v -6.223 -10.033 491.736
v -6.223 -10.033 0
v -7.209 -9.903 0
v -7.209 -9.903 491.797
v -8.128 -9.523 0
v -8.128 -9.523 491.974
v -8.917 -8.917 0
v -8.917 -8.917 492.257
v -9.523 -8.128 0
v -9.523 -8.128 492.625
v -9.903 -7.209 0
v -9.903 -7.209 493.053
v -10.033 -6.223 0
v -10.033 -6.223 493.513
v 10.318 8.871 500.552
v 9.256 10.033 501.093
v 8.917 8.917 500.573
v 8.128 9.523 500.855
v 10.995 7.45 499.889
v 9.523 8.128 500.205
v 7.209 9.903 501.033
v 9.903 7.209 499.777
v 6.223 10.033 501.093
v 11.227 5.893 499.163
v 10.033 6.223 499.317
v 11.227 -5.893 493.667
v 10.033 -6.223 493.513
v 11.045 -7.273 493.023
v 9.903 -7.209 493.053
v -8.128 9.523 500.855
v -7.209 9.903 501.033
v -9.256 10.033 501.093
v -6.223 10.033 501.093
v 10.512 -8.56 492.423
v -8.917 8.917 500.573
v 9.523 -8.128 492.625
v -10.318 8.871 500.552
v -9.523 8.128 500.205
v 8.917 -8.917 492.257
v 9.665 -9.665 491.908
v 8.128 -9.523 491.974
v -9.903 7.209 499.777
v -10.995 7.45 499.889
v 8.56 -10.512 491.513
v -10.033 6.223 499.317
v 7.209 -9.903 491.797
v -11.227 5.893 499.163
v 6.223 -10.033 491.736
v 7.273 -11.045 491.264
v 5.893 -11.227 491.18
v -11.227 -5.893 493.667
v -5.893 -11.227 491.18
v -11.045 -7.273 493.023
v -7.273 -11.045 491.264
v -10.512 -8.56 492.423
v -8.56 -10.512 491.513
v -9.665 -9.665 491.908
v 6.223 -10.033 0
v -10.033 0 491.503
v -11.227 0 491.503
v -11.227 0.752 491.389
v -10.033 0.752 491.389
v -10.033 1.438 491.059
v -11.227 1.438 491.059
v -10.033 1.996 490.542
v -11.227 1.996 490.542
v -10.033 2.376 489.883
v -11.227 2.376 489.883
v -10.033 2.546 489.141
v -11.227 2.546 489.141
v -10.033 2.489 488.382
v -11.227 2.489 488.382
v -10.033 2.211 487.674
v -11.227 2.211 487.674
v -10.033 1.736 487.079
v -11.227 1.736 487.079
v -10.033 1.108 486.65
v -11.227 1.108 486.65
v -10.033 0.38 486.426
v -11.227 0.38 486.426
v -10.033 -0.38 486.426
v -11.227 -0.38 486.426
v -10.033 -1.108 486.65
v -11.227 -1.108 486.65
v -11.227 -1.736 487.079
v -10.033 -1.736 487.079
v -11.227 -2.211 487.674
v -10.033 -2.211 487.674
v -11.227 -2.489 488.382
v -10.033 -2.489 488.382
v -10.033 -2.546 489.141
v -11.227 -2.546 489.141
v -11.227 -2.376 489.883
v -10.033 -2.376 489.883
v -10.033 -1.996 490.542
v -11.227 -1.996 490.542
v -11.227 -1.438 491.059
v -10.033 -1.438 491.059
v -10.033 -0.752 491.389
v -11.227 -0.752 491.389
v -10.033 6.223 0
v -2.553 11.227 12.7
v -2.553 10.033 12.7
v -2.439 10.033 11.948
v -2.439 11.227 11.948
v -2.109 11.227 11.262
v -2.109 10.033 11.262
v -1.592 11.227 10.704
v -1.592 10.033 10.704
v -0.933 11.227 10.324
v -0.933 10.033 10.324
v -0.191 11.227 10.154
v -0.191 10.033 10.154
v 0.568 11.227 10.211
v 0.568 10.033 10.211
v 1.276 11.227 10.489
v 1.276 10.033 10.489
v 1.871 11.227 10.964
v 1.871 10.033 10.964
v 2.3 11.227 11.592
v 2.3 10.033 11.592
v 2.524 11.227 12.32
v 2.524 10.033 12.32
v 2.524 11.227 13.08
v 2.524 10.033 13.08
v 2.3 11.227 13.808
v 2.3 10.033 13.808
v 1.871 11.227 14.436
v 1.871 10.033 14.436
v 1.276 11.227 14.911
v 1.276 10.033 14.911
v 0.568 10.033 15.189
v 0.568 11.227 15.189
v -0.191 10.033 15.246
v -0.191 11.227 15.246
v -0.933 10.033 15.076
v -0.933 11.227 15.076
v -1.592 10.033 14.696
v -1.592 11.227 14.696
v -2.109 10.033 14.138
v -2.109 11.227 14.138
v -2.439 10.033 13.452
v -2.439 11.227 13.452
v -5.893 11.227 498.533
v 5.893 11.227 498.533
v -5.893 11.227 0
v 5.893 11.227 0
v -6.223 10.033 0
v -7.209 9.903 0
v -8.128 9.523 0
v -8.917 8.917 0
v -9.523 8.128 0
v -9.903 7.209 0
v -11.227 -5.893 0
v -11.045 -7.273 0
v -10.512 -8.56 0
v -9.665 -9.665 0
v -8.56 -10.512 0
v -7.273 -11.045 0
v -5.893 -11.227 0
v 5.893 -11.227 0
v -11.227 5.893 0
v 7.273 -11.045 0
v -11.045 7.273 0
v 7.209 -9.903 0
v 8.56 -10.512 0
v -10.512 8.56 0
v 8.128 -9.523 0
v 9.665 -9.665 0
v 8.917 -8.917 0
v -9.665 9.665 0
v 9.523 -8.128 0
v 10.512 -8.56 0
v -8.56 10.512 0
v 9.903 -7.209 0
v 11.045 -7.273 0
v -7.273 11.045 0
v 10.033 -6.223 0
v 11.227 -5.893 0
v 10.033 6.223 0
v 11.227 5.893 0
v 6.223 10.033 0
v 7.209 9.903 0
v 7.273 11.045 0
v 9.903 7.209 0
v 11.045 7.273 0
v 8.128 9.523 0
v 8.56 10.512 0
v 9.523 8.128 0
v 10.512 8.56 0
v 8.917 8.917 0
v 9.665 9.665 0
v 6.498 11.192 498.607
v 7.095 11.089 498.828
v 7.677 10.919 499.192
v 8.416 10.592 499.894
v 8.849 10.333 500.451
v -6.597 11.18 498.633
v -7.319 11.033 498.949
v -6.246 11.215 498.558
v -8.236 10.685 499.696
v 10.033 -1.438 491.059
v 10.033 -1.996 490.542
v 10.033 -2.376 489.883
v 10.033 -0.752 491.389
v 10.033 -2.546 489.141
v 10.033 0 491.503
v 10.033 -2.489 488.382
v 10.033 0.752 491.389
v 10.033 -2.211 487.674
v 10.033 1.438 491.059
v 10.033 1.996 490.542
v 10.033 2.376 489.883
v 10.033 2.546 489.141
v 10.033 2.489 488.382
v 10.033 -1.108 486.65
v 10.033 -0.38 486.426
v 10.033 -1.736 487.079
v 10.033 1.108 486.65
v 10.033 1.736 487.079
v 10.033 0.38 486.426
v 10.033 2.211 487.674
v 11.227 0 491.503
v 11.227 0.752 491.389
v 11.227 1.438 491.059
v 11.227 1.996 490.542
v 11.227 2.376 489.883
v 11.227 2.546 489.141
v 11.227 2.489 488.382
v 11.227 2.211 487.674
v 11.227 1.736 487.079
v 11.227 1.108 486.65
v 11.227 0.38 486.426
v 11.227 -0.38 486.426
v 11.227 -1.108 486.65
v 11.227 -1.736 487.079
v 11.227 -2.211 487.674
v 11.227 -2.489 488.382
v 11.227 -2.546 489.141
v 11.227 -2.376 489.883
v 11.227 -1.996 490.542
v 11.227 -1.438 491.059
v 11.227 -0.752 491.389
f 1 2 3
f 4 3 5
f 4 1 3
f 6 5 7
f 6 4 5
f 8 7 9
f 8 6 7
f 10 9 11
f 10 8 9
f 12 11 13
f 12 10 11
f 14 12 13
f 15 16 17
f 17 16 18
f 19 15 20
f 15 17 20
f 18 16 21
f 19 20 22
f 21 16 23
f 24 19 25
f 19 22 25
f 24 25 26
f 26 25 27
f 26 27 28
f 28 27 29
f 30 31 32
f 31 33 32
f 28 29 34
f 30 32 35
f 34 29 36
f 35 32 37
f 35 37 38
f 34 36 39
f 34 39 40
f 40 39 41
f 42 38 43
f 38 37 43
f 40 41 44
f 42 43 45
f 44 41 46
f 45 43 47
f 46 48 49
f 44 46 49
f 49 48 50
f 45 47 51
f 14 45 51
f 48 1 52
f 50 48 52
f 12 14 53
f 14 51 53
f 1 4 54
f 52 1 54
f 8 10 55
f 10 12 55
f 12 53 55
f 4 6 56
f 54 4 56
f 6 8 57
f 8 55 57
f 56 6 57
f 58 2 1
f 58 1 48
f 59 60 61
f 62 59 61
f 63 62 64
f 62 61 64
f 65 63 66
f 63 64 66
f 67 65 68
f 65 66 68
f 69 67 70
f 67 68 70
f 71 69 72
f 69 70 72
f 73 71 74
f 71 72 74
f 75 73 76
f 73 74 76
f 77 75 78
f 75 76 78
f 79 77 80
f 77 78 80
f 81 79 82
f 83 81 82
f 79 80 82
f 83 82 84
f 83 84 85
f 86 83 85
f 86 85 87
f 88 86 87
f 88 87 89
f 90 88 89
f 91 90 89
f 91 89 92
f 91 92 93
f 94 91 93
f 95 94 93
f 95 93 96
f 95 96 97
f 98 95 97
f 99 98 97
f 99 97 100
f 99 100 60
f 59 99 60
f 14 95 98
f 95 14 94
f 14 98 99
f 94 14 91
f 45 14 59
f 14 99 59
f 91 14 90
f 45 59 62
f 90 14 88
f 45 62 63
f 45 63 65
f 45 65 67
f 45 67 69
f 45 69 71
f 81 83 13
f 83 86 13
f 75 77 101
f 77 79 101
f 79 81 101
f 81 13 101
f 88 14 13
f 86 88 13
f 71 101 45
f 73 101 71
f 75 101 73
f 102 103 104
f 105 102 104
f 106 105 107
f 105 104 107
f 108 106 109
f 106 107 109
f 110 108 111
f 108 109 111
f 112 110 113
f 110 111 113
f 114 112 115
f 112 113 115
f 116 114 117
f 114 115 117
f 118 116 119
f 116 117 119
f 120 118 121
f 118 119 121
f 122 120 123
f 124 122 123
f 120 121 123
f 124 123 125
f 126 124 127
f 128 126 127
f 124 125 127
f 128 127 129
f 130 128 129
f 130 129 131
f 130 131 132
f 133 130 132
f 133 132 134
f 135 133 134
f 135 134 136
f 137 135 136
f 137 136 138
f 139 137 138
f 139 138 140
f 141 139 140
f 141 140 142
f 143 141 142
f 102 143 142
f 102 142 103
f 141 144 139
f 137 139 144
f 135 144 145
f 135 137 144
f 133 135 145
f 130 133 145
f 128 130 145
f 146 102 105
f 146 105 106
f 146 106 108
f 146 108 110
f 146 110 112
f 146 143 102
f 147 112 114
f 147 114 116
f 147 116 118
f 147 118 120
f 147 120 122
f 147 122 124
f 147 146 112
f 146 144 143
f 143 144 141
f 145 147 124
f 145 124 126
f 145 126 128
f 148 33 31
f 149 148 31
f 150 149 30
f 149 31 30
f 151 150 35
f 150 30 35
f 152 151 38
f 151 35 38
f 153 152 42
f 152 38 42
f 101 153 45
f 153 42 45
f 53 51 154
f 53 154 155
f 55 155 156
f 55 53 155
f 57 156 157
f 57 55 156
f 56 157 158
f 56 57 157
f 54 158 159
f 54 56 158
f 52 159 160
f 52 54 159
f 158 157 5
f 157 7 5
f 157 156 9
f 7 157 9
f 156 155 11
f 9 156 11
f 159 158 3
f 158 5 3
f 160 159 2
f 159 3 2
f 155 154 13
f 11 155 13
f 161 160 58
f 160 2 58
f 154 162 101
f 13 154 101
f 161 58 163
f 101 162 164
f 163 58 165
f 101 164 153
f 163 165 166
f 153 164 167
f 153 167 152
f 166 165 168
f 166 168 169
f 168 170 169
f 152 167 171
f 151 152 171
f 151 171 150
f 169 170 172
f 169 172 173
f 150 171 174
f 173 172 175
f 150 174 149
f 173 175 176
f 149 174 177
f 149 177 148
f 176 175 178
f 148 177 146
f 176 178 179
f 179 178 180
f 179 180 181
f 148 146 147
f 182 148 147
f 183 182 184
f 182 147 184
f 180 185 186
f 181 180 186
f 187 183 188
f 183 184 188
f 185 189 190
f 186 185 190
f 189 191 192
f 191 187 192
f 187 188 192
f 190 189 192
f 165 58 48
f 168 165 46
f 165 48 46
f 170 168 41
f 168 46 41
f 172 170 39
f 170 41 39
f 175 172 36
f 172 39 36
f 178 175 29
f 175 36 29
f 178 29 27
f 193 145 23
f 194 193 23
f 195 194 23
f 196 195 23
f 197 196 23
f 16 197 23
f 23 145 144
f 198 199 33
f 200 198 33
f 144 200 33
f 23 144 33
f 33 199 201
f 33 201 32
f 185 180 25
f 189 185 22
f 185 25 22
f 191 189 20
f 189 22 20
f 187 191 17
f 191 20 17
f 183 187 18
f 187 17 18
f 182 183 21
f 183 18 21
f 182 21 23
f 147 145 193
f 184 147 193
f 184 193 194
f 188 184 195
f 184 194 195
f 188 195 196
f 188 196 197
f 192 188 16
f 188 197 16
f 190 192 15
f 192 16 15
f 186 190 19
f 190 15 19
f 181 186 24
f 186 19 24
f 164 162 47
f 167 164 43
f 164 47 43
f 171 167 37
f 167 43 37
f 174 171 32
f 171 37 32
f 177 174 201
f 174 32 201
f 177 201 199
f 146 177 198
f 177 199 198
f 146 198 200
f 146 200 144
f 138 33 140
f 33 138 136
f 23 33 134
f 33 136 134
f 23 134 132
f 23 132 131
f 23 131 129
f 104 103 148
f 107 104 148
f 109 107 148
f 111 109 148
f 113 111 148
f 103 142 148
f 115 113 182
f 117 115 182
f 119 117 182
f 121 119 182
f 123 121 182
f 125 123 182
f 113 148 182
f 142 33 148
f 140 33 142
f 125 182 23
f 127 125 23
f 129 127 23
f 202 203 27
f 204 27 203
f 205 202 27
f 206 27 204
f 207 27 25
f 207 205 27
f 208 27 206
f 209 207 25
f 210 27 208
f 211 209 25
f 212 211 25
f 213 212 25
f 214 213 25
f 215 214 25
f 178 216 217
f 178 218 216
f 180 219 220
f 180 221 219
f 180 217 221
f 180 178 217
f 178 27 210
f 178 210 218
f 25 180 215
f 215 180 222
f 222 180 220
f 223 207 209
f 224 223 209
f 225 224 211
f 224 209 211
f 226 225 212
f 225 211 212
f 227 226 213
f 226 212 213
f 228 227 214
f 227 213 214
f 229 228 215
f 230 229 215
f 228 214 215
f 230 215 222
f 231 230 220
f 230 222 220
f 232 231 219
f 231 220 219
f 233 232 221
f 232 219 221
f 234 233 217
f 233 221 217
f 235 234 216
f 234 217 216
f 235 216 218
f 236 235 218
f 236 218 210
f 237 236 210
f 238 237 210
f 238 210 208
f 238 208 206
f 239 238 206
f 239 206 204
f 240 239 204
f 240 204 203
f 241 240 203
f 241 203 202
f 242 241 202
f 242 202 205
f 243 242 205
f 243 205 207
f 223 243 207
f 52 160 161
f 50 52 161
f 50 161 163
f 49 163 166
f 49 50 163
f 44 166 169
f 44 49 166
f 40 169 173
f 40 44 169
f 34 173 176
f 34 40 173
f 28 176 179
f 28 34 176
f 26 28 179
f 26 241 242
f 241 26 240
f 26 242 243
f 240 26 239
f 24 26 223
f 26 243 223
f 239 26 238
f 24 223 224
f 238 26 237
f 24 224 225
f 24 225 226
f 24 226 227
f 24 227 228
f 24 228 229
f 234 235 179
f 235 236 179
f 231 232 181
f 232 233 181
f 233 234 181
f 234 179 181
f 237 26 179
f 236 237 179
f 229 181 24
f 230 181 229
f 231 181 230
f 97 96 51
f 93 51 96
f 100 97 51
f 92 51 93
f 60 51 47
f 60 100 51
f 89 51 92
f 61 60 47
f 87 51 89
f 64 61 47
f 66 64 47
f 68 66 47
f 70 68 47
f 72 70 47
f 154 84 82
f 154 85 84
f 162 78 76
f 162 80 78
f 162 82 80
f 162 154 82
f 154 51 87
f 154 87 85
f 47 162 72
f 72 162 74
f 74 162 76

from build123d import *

# Parameters (mm, degrees)
SKETCH4_W                  = 22.4536
SKETCH4_H                  = 22.4536
SKETCH4_W_2                = 20.066
SKETCH4_H_2                = 20.066
BOSS_EXTRUDE2_DEPTH        = 501.65
FILLET2_R                  = 3.81
FILLET1_R                  = 5.334
F_10_CLEARANCE_HOLE1_D     = 5.1054
F_10_CLEARANCE_HOLE1_DEPTH = 16.51
F_10_CLEARANCE_HOLE1_TIP   = 1.533816902
F_10_CLEARANCE_HOLE2_D     = 5.1054
CUT_EXTRUDE1_DEPTH         = 23.4536
CUT_EXTRUDE2_DEPTH         = 23.4536


with BuildPart() as part:
    # Sketch4 → Boss-Extrude2 (new body)
    with BuildSketch(Plane.XY):
        Rectangle(SKETCH4_W, SKETCH4_H)
        Rectangle(SKETCH4_W_2, SKETCH4_H_2, mode=Mode.SUBTRACT)
    extrude(amount=BOSS_EXTRUDE2_DEPTH)

    # Fillet2
    fillet2_edges = [part.edges().sort_by_distance(p)[0] for p in [
        (-10.033, 10.033, 250.825),
        (-10.033, -10.033, 250.825),
        (10.033, -10.033, 250.825),
        (10.033, 10.033, 250.825),
    ]]
    fillet(fillet2_edges, radius=FILLET2_R)

    # Fillet1
    fillet1_edges = [part.edges().sort_by_distance(p)[0] for p in [
        (-11.2268, 11.2268, 250.825),
        (11.2268, 11.2268, 250.825),
        (11.2268, -11.2268, 250.825),
        (-11.2268, -11.2268, 250.825),
    ]]
    fillet(fillet1_edges, radius=FILLET1_R)

    # #10 Clearance Hole1
    with Locations(Plane(origin=(0, 11.2268, 0), x_dir=(1, 0, 0), z_dir=(0, 1, 0))):
        with Locations((0, -12.7)):
            Hole(F_10_CLEARANCE_HOLE1_D / 2, depth=F_10_CLEARANCE_HOLE1_DEPTH)
            with Locations((0, 0, -(F_10_CLEARANCE_HOLE1_DEPTH + F_10_CLEARANCE_HOLE1_TIP / 2))):  # 118° drill point
                Cone(0, F_10_CLEARANCE_HOLE1_D / 2, F_10_CLEARANCE_HOLE1_TIP, mode=Mode.SUBTRACT)

    # #10 Clearance Hole2 (through all)
    with Locations(Plane(origin=(11.2268, 0, 0), x_dir=(0, 0, -1), z_dir=(1, 0, 0))):
        with Locations((-488.95, 0)):
            Hole(F_10_CLEARANCE_HOLE2_D / 2)

    # Sketch10 → Cut-Extrude1 (cut, through all)
    with BuildSketch(Plane.ZY.offset(11.2268)):
        Polygon((501.65, 11.2268), (491.179714367, -11.2268), (501.65, -11.2268), align=None)
    extrude(amount=-CUT_EXTRUDE1_DEPTH, mode=Mode.SUBTRACT)

    # Sketch11 → Cut-Extrude2 (cut, through all)
    with BuildSketch(Plane.ZY.offset(11.2268)):
        Polygon((501.65, 11.2268), (498.533209556, 11.2268), (501.093321918, 10.033), align=None)
    extrude(amount=-CUT_EXTRUDE2_DEPTH, mode=Mode.SUBTRACT)


solid = part.part
